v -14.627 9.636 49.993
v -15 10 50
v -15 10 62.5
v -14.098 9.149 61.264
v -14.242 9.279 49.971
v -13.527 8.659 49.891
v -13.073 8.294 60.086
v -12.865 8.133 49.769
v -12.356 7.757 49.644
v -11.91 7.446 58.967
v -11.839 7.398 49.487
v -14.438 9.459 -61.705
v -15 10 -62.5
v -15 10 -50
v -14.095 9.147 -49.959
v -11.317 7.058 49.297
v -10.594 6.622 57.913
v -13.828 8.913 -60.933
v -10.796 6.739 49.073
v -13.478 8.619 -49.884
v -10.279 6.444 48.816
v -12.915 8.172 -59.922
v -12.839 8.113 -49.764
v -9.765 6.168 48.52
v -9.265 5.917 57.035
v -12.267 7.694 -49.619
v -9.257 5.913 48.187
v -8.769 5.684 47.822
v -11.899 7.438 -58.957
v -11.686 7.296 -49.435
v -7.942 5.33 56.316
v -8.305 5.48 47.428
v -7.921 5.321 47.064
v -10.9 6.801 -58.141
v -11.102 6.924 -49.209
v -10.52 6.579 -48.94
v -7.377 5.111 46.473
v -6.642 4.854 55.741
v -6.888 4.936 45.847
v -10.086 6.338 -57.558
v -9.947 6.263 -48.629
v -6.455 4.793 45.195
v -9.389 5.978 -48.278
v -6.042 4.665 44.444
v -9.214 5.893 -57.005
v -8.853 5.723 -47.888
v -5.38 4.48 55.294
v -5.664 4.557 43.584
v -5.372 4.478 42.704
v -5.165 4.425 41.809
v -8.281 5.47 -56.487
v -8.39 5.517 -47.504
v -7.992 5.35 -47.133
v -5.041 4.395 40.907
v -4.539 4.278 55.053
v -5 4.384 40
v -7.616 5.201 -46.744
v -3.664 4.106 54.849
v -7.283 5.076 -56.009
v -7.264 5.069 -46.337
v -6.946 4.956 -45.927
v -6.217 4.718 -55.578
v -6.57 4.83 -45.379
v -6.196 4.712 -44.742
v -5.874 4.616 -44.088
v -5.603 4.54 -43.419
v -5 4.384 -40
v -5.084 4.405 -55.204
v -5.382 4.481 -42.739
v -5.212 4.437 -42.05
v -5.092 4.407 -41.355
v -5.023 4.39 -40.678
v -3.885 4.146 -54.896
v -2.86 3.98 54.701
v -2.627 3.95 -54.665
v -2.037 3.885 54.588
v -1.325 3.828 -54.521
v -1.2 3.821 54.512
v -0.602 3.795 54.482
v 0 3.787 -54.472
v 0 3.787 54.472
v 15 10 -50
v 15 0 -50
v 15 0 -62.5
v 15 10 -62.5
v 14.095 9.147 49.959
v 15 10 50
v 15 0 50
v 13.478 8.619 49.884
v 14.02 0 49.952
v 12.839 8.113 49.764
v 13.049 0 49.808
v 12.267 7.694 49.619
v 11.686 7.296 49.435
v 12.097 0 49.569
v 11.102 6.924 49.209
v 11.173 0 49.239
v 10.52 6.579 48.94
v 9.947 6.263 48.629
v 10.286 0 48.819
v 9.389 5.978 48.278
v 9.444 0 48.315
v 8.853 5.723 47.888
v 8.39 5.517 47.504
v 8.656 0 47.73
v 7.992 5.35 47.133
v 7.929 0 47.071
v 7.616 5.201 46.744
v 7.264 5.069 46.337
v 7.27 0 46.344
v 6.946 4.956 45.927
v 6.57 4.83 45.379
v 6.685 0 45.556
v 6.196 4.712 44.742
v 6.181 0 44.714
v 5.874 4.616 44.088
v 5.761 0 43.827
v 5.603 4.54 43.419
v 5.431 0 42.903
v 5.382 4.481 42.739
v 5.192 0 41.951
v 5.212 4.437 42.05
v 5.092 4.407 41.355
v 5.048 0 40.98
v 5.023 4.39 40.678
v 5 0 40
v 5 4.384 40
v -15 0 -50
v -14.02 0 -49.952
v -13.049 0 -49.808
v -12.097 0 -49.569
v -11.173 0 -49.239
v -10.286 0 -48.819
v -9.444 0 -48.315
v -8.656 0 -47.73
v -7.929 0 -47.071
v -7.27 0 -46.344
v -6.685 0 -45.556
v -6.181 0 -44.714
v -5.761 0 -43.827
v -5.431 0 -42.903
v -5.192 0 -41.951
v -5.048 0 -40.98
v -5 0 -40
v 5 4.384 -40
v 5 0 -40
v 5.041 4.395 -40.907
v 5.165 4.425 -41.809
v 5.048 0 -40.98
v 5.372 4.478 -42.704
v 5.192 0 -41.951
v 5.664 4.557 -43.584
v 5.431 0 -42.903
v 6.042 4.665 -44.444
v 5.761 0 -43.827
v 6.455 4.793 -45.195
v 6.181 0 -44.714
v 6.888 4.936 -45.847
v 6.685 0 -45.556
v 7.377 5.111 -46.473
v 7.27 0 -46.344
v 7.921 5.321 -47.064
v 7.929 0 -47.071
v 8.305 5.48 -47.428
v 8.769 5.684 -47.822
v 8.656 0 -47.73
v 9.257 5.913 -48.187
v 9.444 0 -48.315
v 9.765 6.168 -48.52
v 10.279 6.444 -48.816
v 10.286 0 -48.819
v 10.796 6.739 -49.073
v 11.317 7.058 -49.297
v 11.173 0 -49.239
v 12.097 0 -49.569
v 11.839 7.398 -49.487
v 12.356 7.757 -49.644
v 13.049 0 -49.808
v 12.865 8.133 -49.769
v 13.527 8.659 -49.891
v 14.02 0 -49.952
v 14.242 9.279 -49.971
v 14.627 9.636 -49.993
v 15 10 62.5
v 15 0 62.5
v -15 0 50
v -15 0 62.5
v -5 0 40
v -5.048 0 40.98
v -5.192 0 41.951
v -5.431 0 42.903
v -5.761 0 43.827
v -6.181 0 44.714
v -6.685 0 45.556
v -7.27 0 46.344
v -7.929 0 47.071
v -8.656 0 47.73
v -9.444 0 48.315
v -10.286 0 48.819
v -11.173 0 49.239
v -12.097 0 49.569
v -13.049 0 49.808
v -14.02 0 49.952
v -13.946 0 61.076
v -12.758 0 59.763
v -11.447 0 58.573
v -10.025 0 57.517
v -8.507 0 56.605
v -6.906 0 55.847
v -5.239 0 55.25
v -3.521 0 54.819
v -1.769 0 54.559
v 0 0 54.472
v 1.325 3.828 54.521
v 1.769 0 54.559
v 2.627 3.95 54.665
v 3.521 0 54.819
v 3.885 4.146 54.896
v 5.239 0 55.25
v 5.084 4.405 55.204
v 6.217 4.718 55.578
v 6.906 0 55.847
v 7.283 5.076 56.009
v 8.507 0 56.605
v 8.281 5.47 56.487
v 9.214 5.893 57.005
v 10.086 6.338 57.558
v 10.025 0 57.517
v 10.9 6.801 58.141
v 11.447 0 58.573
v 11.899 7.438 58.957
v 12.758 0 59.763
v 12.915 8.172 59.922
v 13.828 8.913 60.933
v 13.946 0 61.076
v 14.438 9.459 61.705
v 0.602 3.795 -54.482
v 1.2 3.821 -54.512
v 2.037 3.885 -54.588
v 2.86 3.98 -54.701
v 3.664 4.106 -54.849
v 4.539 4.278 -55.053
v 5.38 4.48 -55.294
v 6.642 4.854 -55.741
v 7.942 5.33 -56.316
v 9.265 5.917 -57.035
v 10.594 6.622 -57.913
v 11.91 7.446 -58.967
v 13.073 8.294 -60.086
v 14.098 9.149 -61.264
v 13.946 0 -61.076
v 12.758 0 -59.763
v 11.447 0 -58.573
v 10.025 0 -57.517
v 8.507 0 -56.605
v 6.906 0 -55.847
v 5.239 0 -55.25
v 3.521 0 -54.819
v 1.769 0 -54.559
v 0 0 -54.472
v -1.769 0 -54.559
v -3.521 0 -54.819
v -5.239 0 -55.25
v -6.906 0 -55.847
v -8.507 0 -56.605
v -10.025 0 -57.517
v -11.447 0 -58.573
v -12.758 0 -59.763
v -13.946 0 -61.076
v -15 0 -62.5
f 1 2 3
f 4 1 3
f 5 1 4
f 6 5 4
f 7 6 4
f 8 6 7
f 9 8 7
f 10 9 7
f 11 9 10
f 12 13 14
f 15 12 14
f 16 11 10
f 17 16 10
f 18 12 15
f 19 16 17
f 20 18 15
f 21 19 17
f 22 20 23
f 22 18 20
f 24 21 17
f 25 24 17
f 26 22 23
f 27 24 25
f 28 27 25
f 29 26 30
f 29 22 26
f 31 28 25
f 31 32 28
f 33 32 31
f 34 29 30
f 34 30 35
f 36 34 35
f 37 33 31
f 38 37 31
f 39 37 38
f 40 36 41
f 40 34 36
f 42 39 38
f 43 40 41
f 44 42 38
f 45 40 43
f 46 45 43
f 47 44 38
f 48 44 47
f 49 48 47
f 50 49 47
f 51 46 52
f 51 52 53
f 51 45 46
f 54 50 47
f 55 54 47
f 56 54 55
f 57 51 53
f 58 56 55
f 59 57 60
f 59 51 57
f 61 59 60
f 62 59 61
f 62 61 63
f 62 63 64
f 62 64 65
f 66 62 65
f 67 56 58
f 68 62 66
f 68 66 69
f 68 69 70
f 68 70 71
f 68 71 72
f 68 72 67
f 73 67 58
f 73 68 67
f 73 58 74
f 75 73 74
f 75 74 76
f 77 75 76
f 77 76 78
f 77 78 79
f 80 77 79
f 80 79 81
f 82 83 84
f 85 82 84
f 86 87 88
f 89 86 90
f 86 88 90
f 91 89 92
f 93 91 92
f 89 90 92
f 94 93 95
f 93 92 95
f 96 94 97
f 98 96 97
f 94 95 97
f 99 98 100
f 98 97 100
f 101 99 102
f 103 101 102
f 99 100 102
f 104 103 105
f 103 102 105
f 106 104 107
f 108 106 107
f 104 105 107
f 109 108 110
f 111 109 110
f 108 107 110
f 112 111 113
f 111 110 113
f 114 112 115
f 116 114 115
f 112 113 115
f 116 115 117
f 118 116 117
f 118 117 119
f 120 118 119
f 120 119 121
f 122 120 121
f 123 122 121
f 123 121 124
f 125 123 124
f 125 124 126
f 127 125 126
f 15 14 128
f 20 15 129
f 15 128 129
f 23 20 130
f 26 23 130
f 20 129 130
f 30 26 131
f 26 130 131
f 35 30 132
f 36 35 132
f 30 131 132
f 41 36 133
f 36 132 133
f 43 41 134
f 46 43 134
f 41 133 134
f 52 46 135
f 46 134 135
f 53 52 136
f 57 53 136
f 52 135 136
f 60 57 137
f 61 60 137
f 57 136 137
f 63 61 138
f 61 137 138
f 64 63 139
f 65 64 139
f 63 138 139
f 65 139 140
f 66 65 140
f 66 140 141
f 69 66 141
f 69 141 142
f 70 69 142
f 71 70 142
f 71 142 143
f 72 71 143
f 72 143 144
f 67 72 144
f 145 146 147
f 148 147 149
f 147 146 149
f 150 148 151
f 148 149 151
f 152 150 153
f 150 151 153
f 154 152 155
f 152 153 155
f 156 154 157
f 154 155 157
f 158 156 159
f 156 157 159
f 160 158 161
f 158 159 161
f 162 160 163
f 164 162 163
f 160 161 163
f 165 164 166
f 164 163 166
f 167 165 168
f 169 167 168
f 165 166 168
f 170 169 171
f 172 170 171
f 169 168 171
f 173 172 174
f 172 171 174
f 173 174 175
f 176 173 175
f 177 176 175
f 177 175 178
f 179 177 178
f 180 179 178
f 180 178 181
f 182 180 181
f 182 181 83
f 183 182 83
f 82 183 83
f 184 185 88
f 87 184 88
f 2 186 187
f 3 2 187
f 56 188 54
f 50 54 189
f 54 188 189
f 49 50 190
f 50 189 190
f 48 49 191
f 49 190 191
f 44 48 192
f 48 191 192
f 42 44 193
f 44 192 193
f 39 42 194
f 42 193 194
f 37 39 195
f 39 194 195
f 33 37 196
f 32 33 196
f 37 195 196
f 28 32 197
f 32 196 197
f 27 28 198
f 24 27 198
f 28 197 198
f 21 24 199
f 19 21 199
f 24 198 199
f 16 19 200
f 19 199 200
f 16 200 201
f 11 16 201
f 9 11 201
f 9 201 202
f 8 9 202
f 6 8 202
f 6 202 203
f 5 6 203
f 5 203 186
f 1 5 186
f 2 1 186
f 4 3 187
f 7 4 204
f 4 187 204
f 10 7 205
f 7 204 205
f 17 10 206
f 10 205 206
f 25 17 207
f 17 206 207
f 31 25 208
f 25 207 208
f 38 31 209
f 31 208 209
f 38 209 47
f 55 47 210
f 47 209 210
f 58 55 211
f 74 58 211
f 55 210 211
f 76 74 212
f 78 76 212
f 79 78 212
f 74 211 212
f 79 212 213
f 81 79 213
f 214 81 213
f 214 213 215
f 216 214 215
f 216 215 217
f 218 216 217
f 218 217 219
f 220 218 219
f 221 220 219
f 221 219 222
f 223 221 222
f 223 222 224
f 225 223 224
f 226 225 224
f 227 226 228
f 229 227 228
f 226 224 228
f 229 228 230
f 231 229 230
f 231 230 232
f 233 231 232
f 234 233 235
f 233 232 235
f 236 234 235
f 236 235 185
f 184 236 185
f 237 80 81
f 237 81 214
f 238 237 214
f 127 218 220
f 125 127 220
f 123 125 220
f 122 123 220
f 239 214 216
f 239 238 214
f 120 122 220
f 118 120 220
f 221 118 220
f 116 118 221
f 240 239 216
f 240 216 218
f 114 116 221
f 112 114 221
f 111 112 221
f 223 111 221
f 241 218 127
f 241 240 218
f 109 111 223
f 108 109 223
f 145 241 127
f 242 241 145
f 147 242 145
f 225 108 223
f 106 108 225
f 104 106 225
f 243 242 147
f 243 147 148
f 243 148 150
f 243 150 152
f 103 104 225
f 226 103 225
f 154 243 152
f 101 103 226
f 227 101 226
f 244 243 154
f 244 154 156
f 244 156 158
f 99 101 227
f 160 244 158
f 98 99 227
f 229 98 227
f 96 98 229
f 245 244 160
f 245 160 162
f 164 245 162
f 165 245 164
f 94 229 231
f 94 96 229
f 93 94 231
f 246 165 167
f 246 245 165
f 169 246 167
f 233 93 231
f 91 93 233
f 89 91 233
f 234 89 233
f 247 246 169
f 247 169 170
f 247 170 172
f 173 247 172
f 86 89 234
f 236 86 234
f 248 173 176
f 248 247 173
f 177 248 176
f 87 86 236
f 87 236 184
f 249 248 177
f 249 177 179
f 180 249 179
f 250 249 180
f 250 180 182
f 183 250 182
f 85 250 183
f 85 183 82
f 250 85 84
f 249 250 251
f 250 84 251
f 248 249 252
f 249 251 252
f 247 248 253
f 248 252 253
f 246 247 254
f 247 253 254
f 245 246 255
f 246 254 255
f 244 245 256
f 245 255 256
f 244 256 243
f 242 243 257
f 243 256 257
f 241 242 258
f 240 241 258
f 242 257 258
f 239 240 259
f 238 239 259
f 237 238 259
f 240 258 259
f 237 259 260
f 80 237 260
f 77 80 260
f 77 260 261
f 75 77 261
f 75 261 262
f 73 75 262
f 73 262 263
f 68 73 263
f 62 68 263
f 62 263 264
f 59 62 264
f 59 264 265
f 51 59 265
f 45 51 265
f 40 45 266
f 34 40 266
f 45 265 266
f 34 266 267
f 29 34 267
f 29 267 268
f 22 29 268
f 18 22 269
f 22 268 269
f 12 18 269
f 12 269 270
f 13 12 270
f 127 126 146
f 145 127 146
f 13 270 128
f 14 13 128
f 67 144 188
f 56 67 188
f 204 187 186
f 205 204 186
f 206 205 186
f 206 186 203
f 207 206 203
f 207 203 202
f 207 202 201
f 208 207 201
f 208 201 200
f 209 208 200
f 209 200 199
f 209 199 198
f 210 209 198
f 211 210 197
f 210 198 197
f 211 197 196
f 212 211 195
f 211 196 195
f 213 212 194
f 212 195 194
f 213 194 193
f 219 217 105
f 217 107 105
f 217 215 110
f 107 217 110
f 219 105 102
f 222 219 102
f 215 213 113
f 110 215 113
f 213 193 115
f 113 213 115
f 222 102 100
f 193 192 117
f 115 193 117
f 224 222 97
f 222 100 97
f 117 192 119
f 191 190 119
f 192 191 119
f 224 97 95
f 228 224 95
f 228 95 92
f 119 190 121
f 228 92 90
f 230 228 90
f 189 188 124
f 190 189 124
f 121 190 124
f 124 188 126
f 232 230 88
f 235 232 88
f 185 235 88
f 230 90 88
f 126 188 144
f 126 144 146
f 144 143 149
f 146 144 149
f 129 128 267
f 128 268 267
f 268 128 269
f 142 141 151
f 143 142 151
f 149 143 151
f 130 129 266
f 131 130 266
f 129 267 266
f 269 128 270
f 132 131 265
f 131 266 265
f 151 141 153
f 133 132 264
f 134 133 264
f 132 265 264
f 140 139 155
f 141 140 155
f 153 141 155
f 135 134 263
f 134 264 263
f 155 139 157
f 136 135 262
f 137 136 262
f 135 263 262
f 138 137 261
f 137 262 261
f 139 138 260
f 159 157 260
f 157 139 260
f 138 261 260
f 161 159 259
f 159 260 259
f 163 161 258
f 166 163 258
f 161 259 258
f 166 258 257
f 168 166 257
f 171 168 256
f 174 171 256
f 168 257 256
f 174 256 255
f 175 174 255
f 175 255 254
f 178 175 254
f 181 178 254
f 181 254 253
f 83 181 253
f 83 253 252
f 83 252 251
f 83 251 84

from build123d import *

# Parameters (mm, degrees)
BOSS_EXTRU_1_DEPTH           = 10
ENL_V_MAT_EXTRU_1_DEPTH      = 66.048059156
ENL_V_MAT_EXTRU_1_DEPTH_BACK = 66.048059156


with BuildPart() as part:
    # Esquisse1 → Boss.-Extru.1 (new body)
    with BuildSketch(Plane(origin=(0, 0, 0), x_dir=(1, 0, 0), z_dir=(0, 1, 0))):
        with BuildLine():
            Line((-15, 62.5), (-15, 50))
            ThreePointArc((-15, 50), (-7.928932188, 47.071067812), (-5, 40))
            Line((-5, 40), (-5, -40))
            ThreePointArc((-5, -40), (-7.928932188, -47.071067812), (-15, -50))
            Line((-15, -50), (-15, -62.5))
            ThreePointArc((-15, -62.5), (0, -54.472243623), (15, -62.5))
            Line((15, -62.5), (15, -50))
            ThreePointArc((15, -50), (7.928932188, -47.071067812), (5, -40))
            Line((5, -40), (5, 40))
            ThreePointArc((5, 40), (7.928932188, 47.071067812), (15, 50))
            Line((15, 50), (15, 62.5))
            ThreePointArc((15, 62.5), (0, 54.472243623), (-15, 62.5))
        make_face()
    extrude(amount=BOSS_EXTRU_1_DEPTH)

    # Esquisse2 → Enlèv. mat.-Extru.1 (cut, two sides: drawn at the far end of the back side and taken through both)
    with BuildSketch(Plane.XY.offset(-ENL_V_MAT_EXTRU_1_DEPTH_BACK)):
        with BuildLine():
            ThreePointArc((-15, 10), (-8.117941502, 5.401555527), (0, 3.786796564))
            Line((0, 3.786796564), (0, 10))
            Line((0, 10), (-15, 10))
        make_face()
        with BuildLine():
            Line((0, 10), (0, 3.786796564))
            ThreePointArc((0, 3.786796564), (8.117941502, 5.401555527), (15, 10))
            Line((15, 10), (0, 10))
        make_face()
        with BuildLine():
            ThreePointArc((-15, 10), (-8.117941502, 5.401555527), (0, 3.786796564))
            Line((0, 3.786796564), (0, 10))
            Line((0, 10), (-15, 10))
        make_face()
        with BuildLine():
            Line((0, 10), (0, 3.786796564))
            ThreePointArc((0, 3.786796564), (8.117941502, 5.401555527), (15, 10))
            Line((15, 10), (0, 10))
        make_face()
    extrude(amount=ENL_V_MAT_EXTRU_1_DEPTH + ENL_V_MAT_EXTRU_1_DEPTH_BACK, mode=Mode.SUBTRACT)


solid = part.part
